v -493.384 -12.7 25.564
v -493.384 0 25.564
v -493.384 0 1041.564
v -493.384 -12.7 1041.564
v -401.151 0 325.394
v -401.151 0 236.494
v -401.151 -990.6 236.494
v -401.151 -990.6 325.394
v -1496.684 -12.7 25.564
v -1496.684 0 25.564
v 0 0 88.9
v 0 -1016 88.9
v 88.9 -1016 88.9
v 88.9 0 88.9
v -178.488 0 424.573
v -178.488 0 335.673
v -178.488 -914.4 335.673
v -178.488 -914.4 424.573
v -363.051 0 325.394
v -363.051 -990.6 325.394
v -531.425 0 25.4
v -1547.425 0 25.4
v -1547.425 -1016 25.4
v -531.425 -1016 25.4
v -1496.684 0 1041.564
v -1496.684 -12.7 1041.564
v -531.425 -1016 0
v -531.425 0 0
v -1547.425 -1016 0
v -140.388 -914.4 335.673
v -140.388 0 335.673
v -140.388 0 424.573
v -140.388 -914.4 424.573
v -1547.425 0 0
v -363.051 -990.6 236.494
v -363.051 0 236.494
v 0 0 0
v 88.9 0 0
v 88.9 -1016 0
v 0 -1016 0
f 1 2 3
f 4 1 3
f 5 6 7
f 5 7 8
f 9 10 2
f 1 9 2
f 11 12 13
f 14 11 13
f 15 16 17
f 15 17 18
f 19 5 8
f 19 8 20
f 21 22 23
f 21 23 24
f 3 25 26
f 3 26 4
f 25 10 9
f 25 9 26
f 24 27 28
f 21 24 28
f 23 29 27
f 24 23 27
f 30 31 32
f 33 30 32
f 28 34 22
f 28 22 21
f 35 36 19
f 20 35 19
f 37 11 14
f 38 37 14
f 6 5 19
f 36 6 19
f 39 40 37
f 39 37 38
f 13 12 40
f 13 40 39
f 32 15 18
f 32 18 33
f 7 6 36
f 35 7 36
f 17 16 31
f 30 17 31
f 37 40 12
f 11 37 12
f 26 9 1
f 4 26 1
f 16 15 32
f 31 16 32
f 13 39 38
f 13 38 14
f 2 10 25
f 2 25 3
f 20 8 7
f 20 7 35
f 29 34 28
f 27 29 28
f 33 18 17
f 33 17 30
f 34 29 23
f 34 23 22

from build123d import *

# Parameters (mm, degrees)
F0_W     = 88.9
F0_H     = 88.9
F1_DEPTH = 1016
F2_W     = 1016
F2_H     = 1016
F3_DEPTH = 25.4
F4_W     = 38.1
F4_H     = 88.9
F5_DEPTH = 990.6
F6_W     = 1003.3
F6_H     = 1016
F7_DEPTH = 12.7
F8_W     = 38.1
F8_H     = 88.9
F9_DEPTH = 914.4


with BuildPart() as f1:
    # F0 (on Front) → F1 (new body)
    with BuildSketch(Plane.XZ):
        with Locations((44.45, 44.45)):
            Rectangle(F0_W, F0_H)
    extrude(amount=F1_DEPTH)


with BuildPart() as f3:
    # F2 (on Top) → F3 (new body)
    with BuildSketch(Plane.XY):
        with Locations((-1039.424937, -508)):
            Rectangle(F2_W, F2_H)
    extrude(amount=F3_DEPTH)


with BuildPart() as f5:
    # F4 (on Front) → F5 (new body)
    with BuildSketch(Plane.XZ):
        with Locations((-382.101442, 280.943796)):
            Rectangle(F4_W, F4_H)
    extrude(amount=F5_DEPTH)


with BuildPart() as f7:
    # F6 (on Front) → F7 (new body)
    with BuildSketch(Plane.XZ):
        with Locations((-995.033979, 533.563709)):
            Rectangle(F6_W, F6_H)
    extrude(amount=F7_DEPTH)


with BuildPart() as f9:
    # F8 (on Front) → F9 (new body)
    with BuildSketch(Plane.XZ):
        with Locations((-159.437669, 380.122736)):
            Rectangle(F8_W, F8_H)
    extrude(amount=F9_DEPTH)


solid = Compound([f1.part, f3.part, f5.part, f7.part, f9.part])
